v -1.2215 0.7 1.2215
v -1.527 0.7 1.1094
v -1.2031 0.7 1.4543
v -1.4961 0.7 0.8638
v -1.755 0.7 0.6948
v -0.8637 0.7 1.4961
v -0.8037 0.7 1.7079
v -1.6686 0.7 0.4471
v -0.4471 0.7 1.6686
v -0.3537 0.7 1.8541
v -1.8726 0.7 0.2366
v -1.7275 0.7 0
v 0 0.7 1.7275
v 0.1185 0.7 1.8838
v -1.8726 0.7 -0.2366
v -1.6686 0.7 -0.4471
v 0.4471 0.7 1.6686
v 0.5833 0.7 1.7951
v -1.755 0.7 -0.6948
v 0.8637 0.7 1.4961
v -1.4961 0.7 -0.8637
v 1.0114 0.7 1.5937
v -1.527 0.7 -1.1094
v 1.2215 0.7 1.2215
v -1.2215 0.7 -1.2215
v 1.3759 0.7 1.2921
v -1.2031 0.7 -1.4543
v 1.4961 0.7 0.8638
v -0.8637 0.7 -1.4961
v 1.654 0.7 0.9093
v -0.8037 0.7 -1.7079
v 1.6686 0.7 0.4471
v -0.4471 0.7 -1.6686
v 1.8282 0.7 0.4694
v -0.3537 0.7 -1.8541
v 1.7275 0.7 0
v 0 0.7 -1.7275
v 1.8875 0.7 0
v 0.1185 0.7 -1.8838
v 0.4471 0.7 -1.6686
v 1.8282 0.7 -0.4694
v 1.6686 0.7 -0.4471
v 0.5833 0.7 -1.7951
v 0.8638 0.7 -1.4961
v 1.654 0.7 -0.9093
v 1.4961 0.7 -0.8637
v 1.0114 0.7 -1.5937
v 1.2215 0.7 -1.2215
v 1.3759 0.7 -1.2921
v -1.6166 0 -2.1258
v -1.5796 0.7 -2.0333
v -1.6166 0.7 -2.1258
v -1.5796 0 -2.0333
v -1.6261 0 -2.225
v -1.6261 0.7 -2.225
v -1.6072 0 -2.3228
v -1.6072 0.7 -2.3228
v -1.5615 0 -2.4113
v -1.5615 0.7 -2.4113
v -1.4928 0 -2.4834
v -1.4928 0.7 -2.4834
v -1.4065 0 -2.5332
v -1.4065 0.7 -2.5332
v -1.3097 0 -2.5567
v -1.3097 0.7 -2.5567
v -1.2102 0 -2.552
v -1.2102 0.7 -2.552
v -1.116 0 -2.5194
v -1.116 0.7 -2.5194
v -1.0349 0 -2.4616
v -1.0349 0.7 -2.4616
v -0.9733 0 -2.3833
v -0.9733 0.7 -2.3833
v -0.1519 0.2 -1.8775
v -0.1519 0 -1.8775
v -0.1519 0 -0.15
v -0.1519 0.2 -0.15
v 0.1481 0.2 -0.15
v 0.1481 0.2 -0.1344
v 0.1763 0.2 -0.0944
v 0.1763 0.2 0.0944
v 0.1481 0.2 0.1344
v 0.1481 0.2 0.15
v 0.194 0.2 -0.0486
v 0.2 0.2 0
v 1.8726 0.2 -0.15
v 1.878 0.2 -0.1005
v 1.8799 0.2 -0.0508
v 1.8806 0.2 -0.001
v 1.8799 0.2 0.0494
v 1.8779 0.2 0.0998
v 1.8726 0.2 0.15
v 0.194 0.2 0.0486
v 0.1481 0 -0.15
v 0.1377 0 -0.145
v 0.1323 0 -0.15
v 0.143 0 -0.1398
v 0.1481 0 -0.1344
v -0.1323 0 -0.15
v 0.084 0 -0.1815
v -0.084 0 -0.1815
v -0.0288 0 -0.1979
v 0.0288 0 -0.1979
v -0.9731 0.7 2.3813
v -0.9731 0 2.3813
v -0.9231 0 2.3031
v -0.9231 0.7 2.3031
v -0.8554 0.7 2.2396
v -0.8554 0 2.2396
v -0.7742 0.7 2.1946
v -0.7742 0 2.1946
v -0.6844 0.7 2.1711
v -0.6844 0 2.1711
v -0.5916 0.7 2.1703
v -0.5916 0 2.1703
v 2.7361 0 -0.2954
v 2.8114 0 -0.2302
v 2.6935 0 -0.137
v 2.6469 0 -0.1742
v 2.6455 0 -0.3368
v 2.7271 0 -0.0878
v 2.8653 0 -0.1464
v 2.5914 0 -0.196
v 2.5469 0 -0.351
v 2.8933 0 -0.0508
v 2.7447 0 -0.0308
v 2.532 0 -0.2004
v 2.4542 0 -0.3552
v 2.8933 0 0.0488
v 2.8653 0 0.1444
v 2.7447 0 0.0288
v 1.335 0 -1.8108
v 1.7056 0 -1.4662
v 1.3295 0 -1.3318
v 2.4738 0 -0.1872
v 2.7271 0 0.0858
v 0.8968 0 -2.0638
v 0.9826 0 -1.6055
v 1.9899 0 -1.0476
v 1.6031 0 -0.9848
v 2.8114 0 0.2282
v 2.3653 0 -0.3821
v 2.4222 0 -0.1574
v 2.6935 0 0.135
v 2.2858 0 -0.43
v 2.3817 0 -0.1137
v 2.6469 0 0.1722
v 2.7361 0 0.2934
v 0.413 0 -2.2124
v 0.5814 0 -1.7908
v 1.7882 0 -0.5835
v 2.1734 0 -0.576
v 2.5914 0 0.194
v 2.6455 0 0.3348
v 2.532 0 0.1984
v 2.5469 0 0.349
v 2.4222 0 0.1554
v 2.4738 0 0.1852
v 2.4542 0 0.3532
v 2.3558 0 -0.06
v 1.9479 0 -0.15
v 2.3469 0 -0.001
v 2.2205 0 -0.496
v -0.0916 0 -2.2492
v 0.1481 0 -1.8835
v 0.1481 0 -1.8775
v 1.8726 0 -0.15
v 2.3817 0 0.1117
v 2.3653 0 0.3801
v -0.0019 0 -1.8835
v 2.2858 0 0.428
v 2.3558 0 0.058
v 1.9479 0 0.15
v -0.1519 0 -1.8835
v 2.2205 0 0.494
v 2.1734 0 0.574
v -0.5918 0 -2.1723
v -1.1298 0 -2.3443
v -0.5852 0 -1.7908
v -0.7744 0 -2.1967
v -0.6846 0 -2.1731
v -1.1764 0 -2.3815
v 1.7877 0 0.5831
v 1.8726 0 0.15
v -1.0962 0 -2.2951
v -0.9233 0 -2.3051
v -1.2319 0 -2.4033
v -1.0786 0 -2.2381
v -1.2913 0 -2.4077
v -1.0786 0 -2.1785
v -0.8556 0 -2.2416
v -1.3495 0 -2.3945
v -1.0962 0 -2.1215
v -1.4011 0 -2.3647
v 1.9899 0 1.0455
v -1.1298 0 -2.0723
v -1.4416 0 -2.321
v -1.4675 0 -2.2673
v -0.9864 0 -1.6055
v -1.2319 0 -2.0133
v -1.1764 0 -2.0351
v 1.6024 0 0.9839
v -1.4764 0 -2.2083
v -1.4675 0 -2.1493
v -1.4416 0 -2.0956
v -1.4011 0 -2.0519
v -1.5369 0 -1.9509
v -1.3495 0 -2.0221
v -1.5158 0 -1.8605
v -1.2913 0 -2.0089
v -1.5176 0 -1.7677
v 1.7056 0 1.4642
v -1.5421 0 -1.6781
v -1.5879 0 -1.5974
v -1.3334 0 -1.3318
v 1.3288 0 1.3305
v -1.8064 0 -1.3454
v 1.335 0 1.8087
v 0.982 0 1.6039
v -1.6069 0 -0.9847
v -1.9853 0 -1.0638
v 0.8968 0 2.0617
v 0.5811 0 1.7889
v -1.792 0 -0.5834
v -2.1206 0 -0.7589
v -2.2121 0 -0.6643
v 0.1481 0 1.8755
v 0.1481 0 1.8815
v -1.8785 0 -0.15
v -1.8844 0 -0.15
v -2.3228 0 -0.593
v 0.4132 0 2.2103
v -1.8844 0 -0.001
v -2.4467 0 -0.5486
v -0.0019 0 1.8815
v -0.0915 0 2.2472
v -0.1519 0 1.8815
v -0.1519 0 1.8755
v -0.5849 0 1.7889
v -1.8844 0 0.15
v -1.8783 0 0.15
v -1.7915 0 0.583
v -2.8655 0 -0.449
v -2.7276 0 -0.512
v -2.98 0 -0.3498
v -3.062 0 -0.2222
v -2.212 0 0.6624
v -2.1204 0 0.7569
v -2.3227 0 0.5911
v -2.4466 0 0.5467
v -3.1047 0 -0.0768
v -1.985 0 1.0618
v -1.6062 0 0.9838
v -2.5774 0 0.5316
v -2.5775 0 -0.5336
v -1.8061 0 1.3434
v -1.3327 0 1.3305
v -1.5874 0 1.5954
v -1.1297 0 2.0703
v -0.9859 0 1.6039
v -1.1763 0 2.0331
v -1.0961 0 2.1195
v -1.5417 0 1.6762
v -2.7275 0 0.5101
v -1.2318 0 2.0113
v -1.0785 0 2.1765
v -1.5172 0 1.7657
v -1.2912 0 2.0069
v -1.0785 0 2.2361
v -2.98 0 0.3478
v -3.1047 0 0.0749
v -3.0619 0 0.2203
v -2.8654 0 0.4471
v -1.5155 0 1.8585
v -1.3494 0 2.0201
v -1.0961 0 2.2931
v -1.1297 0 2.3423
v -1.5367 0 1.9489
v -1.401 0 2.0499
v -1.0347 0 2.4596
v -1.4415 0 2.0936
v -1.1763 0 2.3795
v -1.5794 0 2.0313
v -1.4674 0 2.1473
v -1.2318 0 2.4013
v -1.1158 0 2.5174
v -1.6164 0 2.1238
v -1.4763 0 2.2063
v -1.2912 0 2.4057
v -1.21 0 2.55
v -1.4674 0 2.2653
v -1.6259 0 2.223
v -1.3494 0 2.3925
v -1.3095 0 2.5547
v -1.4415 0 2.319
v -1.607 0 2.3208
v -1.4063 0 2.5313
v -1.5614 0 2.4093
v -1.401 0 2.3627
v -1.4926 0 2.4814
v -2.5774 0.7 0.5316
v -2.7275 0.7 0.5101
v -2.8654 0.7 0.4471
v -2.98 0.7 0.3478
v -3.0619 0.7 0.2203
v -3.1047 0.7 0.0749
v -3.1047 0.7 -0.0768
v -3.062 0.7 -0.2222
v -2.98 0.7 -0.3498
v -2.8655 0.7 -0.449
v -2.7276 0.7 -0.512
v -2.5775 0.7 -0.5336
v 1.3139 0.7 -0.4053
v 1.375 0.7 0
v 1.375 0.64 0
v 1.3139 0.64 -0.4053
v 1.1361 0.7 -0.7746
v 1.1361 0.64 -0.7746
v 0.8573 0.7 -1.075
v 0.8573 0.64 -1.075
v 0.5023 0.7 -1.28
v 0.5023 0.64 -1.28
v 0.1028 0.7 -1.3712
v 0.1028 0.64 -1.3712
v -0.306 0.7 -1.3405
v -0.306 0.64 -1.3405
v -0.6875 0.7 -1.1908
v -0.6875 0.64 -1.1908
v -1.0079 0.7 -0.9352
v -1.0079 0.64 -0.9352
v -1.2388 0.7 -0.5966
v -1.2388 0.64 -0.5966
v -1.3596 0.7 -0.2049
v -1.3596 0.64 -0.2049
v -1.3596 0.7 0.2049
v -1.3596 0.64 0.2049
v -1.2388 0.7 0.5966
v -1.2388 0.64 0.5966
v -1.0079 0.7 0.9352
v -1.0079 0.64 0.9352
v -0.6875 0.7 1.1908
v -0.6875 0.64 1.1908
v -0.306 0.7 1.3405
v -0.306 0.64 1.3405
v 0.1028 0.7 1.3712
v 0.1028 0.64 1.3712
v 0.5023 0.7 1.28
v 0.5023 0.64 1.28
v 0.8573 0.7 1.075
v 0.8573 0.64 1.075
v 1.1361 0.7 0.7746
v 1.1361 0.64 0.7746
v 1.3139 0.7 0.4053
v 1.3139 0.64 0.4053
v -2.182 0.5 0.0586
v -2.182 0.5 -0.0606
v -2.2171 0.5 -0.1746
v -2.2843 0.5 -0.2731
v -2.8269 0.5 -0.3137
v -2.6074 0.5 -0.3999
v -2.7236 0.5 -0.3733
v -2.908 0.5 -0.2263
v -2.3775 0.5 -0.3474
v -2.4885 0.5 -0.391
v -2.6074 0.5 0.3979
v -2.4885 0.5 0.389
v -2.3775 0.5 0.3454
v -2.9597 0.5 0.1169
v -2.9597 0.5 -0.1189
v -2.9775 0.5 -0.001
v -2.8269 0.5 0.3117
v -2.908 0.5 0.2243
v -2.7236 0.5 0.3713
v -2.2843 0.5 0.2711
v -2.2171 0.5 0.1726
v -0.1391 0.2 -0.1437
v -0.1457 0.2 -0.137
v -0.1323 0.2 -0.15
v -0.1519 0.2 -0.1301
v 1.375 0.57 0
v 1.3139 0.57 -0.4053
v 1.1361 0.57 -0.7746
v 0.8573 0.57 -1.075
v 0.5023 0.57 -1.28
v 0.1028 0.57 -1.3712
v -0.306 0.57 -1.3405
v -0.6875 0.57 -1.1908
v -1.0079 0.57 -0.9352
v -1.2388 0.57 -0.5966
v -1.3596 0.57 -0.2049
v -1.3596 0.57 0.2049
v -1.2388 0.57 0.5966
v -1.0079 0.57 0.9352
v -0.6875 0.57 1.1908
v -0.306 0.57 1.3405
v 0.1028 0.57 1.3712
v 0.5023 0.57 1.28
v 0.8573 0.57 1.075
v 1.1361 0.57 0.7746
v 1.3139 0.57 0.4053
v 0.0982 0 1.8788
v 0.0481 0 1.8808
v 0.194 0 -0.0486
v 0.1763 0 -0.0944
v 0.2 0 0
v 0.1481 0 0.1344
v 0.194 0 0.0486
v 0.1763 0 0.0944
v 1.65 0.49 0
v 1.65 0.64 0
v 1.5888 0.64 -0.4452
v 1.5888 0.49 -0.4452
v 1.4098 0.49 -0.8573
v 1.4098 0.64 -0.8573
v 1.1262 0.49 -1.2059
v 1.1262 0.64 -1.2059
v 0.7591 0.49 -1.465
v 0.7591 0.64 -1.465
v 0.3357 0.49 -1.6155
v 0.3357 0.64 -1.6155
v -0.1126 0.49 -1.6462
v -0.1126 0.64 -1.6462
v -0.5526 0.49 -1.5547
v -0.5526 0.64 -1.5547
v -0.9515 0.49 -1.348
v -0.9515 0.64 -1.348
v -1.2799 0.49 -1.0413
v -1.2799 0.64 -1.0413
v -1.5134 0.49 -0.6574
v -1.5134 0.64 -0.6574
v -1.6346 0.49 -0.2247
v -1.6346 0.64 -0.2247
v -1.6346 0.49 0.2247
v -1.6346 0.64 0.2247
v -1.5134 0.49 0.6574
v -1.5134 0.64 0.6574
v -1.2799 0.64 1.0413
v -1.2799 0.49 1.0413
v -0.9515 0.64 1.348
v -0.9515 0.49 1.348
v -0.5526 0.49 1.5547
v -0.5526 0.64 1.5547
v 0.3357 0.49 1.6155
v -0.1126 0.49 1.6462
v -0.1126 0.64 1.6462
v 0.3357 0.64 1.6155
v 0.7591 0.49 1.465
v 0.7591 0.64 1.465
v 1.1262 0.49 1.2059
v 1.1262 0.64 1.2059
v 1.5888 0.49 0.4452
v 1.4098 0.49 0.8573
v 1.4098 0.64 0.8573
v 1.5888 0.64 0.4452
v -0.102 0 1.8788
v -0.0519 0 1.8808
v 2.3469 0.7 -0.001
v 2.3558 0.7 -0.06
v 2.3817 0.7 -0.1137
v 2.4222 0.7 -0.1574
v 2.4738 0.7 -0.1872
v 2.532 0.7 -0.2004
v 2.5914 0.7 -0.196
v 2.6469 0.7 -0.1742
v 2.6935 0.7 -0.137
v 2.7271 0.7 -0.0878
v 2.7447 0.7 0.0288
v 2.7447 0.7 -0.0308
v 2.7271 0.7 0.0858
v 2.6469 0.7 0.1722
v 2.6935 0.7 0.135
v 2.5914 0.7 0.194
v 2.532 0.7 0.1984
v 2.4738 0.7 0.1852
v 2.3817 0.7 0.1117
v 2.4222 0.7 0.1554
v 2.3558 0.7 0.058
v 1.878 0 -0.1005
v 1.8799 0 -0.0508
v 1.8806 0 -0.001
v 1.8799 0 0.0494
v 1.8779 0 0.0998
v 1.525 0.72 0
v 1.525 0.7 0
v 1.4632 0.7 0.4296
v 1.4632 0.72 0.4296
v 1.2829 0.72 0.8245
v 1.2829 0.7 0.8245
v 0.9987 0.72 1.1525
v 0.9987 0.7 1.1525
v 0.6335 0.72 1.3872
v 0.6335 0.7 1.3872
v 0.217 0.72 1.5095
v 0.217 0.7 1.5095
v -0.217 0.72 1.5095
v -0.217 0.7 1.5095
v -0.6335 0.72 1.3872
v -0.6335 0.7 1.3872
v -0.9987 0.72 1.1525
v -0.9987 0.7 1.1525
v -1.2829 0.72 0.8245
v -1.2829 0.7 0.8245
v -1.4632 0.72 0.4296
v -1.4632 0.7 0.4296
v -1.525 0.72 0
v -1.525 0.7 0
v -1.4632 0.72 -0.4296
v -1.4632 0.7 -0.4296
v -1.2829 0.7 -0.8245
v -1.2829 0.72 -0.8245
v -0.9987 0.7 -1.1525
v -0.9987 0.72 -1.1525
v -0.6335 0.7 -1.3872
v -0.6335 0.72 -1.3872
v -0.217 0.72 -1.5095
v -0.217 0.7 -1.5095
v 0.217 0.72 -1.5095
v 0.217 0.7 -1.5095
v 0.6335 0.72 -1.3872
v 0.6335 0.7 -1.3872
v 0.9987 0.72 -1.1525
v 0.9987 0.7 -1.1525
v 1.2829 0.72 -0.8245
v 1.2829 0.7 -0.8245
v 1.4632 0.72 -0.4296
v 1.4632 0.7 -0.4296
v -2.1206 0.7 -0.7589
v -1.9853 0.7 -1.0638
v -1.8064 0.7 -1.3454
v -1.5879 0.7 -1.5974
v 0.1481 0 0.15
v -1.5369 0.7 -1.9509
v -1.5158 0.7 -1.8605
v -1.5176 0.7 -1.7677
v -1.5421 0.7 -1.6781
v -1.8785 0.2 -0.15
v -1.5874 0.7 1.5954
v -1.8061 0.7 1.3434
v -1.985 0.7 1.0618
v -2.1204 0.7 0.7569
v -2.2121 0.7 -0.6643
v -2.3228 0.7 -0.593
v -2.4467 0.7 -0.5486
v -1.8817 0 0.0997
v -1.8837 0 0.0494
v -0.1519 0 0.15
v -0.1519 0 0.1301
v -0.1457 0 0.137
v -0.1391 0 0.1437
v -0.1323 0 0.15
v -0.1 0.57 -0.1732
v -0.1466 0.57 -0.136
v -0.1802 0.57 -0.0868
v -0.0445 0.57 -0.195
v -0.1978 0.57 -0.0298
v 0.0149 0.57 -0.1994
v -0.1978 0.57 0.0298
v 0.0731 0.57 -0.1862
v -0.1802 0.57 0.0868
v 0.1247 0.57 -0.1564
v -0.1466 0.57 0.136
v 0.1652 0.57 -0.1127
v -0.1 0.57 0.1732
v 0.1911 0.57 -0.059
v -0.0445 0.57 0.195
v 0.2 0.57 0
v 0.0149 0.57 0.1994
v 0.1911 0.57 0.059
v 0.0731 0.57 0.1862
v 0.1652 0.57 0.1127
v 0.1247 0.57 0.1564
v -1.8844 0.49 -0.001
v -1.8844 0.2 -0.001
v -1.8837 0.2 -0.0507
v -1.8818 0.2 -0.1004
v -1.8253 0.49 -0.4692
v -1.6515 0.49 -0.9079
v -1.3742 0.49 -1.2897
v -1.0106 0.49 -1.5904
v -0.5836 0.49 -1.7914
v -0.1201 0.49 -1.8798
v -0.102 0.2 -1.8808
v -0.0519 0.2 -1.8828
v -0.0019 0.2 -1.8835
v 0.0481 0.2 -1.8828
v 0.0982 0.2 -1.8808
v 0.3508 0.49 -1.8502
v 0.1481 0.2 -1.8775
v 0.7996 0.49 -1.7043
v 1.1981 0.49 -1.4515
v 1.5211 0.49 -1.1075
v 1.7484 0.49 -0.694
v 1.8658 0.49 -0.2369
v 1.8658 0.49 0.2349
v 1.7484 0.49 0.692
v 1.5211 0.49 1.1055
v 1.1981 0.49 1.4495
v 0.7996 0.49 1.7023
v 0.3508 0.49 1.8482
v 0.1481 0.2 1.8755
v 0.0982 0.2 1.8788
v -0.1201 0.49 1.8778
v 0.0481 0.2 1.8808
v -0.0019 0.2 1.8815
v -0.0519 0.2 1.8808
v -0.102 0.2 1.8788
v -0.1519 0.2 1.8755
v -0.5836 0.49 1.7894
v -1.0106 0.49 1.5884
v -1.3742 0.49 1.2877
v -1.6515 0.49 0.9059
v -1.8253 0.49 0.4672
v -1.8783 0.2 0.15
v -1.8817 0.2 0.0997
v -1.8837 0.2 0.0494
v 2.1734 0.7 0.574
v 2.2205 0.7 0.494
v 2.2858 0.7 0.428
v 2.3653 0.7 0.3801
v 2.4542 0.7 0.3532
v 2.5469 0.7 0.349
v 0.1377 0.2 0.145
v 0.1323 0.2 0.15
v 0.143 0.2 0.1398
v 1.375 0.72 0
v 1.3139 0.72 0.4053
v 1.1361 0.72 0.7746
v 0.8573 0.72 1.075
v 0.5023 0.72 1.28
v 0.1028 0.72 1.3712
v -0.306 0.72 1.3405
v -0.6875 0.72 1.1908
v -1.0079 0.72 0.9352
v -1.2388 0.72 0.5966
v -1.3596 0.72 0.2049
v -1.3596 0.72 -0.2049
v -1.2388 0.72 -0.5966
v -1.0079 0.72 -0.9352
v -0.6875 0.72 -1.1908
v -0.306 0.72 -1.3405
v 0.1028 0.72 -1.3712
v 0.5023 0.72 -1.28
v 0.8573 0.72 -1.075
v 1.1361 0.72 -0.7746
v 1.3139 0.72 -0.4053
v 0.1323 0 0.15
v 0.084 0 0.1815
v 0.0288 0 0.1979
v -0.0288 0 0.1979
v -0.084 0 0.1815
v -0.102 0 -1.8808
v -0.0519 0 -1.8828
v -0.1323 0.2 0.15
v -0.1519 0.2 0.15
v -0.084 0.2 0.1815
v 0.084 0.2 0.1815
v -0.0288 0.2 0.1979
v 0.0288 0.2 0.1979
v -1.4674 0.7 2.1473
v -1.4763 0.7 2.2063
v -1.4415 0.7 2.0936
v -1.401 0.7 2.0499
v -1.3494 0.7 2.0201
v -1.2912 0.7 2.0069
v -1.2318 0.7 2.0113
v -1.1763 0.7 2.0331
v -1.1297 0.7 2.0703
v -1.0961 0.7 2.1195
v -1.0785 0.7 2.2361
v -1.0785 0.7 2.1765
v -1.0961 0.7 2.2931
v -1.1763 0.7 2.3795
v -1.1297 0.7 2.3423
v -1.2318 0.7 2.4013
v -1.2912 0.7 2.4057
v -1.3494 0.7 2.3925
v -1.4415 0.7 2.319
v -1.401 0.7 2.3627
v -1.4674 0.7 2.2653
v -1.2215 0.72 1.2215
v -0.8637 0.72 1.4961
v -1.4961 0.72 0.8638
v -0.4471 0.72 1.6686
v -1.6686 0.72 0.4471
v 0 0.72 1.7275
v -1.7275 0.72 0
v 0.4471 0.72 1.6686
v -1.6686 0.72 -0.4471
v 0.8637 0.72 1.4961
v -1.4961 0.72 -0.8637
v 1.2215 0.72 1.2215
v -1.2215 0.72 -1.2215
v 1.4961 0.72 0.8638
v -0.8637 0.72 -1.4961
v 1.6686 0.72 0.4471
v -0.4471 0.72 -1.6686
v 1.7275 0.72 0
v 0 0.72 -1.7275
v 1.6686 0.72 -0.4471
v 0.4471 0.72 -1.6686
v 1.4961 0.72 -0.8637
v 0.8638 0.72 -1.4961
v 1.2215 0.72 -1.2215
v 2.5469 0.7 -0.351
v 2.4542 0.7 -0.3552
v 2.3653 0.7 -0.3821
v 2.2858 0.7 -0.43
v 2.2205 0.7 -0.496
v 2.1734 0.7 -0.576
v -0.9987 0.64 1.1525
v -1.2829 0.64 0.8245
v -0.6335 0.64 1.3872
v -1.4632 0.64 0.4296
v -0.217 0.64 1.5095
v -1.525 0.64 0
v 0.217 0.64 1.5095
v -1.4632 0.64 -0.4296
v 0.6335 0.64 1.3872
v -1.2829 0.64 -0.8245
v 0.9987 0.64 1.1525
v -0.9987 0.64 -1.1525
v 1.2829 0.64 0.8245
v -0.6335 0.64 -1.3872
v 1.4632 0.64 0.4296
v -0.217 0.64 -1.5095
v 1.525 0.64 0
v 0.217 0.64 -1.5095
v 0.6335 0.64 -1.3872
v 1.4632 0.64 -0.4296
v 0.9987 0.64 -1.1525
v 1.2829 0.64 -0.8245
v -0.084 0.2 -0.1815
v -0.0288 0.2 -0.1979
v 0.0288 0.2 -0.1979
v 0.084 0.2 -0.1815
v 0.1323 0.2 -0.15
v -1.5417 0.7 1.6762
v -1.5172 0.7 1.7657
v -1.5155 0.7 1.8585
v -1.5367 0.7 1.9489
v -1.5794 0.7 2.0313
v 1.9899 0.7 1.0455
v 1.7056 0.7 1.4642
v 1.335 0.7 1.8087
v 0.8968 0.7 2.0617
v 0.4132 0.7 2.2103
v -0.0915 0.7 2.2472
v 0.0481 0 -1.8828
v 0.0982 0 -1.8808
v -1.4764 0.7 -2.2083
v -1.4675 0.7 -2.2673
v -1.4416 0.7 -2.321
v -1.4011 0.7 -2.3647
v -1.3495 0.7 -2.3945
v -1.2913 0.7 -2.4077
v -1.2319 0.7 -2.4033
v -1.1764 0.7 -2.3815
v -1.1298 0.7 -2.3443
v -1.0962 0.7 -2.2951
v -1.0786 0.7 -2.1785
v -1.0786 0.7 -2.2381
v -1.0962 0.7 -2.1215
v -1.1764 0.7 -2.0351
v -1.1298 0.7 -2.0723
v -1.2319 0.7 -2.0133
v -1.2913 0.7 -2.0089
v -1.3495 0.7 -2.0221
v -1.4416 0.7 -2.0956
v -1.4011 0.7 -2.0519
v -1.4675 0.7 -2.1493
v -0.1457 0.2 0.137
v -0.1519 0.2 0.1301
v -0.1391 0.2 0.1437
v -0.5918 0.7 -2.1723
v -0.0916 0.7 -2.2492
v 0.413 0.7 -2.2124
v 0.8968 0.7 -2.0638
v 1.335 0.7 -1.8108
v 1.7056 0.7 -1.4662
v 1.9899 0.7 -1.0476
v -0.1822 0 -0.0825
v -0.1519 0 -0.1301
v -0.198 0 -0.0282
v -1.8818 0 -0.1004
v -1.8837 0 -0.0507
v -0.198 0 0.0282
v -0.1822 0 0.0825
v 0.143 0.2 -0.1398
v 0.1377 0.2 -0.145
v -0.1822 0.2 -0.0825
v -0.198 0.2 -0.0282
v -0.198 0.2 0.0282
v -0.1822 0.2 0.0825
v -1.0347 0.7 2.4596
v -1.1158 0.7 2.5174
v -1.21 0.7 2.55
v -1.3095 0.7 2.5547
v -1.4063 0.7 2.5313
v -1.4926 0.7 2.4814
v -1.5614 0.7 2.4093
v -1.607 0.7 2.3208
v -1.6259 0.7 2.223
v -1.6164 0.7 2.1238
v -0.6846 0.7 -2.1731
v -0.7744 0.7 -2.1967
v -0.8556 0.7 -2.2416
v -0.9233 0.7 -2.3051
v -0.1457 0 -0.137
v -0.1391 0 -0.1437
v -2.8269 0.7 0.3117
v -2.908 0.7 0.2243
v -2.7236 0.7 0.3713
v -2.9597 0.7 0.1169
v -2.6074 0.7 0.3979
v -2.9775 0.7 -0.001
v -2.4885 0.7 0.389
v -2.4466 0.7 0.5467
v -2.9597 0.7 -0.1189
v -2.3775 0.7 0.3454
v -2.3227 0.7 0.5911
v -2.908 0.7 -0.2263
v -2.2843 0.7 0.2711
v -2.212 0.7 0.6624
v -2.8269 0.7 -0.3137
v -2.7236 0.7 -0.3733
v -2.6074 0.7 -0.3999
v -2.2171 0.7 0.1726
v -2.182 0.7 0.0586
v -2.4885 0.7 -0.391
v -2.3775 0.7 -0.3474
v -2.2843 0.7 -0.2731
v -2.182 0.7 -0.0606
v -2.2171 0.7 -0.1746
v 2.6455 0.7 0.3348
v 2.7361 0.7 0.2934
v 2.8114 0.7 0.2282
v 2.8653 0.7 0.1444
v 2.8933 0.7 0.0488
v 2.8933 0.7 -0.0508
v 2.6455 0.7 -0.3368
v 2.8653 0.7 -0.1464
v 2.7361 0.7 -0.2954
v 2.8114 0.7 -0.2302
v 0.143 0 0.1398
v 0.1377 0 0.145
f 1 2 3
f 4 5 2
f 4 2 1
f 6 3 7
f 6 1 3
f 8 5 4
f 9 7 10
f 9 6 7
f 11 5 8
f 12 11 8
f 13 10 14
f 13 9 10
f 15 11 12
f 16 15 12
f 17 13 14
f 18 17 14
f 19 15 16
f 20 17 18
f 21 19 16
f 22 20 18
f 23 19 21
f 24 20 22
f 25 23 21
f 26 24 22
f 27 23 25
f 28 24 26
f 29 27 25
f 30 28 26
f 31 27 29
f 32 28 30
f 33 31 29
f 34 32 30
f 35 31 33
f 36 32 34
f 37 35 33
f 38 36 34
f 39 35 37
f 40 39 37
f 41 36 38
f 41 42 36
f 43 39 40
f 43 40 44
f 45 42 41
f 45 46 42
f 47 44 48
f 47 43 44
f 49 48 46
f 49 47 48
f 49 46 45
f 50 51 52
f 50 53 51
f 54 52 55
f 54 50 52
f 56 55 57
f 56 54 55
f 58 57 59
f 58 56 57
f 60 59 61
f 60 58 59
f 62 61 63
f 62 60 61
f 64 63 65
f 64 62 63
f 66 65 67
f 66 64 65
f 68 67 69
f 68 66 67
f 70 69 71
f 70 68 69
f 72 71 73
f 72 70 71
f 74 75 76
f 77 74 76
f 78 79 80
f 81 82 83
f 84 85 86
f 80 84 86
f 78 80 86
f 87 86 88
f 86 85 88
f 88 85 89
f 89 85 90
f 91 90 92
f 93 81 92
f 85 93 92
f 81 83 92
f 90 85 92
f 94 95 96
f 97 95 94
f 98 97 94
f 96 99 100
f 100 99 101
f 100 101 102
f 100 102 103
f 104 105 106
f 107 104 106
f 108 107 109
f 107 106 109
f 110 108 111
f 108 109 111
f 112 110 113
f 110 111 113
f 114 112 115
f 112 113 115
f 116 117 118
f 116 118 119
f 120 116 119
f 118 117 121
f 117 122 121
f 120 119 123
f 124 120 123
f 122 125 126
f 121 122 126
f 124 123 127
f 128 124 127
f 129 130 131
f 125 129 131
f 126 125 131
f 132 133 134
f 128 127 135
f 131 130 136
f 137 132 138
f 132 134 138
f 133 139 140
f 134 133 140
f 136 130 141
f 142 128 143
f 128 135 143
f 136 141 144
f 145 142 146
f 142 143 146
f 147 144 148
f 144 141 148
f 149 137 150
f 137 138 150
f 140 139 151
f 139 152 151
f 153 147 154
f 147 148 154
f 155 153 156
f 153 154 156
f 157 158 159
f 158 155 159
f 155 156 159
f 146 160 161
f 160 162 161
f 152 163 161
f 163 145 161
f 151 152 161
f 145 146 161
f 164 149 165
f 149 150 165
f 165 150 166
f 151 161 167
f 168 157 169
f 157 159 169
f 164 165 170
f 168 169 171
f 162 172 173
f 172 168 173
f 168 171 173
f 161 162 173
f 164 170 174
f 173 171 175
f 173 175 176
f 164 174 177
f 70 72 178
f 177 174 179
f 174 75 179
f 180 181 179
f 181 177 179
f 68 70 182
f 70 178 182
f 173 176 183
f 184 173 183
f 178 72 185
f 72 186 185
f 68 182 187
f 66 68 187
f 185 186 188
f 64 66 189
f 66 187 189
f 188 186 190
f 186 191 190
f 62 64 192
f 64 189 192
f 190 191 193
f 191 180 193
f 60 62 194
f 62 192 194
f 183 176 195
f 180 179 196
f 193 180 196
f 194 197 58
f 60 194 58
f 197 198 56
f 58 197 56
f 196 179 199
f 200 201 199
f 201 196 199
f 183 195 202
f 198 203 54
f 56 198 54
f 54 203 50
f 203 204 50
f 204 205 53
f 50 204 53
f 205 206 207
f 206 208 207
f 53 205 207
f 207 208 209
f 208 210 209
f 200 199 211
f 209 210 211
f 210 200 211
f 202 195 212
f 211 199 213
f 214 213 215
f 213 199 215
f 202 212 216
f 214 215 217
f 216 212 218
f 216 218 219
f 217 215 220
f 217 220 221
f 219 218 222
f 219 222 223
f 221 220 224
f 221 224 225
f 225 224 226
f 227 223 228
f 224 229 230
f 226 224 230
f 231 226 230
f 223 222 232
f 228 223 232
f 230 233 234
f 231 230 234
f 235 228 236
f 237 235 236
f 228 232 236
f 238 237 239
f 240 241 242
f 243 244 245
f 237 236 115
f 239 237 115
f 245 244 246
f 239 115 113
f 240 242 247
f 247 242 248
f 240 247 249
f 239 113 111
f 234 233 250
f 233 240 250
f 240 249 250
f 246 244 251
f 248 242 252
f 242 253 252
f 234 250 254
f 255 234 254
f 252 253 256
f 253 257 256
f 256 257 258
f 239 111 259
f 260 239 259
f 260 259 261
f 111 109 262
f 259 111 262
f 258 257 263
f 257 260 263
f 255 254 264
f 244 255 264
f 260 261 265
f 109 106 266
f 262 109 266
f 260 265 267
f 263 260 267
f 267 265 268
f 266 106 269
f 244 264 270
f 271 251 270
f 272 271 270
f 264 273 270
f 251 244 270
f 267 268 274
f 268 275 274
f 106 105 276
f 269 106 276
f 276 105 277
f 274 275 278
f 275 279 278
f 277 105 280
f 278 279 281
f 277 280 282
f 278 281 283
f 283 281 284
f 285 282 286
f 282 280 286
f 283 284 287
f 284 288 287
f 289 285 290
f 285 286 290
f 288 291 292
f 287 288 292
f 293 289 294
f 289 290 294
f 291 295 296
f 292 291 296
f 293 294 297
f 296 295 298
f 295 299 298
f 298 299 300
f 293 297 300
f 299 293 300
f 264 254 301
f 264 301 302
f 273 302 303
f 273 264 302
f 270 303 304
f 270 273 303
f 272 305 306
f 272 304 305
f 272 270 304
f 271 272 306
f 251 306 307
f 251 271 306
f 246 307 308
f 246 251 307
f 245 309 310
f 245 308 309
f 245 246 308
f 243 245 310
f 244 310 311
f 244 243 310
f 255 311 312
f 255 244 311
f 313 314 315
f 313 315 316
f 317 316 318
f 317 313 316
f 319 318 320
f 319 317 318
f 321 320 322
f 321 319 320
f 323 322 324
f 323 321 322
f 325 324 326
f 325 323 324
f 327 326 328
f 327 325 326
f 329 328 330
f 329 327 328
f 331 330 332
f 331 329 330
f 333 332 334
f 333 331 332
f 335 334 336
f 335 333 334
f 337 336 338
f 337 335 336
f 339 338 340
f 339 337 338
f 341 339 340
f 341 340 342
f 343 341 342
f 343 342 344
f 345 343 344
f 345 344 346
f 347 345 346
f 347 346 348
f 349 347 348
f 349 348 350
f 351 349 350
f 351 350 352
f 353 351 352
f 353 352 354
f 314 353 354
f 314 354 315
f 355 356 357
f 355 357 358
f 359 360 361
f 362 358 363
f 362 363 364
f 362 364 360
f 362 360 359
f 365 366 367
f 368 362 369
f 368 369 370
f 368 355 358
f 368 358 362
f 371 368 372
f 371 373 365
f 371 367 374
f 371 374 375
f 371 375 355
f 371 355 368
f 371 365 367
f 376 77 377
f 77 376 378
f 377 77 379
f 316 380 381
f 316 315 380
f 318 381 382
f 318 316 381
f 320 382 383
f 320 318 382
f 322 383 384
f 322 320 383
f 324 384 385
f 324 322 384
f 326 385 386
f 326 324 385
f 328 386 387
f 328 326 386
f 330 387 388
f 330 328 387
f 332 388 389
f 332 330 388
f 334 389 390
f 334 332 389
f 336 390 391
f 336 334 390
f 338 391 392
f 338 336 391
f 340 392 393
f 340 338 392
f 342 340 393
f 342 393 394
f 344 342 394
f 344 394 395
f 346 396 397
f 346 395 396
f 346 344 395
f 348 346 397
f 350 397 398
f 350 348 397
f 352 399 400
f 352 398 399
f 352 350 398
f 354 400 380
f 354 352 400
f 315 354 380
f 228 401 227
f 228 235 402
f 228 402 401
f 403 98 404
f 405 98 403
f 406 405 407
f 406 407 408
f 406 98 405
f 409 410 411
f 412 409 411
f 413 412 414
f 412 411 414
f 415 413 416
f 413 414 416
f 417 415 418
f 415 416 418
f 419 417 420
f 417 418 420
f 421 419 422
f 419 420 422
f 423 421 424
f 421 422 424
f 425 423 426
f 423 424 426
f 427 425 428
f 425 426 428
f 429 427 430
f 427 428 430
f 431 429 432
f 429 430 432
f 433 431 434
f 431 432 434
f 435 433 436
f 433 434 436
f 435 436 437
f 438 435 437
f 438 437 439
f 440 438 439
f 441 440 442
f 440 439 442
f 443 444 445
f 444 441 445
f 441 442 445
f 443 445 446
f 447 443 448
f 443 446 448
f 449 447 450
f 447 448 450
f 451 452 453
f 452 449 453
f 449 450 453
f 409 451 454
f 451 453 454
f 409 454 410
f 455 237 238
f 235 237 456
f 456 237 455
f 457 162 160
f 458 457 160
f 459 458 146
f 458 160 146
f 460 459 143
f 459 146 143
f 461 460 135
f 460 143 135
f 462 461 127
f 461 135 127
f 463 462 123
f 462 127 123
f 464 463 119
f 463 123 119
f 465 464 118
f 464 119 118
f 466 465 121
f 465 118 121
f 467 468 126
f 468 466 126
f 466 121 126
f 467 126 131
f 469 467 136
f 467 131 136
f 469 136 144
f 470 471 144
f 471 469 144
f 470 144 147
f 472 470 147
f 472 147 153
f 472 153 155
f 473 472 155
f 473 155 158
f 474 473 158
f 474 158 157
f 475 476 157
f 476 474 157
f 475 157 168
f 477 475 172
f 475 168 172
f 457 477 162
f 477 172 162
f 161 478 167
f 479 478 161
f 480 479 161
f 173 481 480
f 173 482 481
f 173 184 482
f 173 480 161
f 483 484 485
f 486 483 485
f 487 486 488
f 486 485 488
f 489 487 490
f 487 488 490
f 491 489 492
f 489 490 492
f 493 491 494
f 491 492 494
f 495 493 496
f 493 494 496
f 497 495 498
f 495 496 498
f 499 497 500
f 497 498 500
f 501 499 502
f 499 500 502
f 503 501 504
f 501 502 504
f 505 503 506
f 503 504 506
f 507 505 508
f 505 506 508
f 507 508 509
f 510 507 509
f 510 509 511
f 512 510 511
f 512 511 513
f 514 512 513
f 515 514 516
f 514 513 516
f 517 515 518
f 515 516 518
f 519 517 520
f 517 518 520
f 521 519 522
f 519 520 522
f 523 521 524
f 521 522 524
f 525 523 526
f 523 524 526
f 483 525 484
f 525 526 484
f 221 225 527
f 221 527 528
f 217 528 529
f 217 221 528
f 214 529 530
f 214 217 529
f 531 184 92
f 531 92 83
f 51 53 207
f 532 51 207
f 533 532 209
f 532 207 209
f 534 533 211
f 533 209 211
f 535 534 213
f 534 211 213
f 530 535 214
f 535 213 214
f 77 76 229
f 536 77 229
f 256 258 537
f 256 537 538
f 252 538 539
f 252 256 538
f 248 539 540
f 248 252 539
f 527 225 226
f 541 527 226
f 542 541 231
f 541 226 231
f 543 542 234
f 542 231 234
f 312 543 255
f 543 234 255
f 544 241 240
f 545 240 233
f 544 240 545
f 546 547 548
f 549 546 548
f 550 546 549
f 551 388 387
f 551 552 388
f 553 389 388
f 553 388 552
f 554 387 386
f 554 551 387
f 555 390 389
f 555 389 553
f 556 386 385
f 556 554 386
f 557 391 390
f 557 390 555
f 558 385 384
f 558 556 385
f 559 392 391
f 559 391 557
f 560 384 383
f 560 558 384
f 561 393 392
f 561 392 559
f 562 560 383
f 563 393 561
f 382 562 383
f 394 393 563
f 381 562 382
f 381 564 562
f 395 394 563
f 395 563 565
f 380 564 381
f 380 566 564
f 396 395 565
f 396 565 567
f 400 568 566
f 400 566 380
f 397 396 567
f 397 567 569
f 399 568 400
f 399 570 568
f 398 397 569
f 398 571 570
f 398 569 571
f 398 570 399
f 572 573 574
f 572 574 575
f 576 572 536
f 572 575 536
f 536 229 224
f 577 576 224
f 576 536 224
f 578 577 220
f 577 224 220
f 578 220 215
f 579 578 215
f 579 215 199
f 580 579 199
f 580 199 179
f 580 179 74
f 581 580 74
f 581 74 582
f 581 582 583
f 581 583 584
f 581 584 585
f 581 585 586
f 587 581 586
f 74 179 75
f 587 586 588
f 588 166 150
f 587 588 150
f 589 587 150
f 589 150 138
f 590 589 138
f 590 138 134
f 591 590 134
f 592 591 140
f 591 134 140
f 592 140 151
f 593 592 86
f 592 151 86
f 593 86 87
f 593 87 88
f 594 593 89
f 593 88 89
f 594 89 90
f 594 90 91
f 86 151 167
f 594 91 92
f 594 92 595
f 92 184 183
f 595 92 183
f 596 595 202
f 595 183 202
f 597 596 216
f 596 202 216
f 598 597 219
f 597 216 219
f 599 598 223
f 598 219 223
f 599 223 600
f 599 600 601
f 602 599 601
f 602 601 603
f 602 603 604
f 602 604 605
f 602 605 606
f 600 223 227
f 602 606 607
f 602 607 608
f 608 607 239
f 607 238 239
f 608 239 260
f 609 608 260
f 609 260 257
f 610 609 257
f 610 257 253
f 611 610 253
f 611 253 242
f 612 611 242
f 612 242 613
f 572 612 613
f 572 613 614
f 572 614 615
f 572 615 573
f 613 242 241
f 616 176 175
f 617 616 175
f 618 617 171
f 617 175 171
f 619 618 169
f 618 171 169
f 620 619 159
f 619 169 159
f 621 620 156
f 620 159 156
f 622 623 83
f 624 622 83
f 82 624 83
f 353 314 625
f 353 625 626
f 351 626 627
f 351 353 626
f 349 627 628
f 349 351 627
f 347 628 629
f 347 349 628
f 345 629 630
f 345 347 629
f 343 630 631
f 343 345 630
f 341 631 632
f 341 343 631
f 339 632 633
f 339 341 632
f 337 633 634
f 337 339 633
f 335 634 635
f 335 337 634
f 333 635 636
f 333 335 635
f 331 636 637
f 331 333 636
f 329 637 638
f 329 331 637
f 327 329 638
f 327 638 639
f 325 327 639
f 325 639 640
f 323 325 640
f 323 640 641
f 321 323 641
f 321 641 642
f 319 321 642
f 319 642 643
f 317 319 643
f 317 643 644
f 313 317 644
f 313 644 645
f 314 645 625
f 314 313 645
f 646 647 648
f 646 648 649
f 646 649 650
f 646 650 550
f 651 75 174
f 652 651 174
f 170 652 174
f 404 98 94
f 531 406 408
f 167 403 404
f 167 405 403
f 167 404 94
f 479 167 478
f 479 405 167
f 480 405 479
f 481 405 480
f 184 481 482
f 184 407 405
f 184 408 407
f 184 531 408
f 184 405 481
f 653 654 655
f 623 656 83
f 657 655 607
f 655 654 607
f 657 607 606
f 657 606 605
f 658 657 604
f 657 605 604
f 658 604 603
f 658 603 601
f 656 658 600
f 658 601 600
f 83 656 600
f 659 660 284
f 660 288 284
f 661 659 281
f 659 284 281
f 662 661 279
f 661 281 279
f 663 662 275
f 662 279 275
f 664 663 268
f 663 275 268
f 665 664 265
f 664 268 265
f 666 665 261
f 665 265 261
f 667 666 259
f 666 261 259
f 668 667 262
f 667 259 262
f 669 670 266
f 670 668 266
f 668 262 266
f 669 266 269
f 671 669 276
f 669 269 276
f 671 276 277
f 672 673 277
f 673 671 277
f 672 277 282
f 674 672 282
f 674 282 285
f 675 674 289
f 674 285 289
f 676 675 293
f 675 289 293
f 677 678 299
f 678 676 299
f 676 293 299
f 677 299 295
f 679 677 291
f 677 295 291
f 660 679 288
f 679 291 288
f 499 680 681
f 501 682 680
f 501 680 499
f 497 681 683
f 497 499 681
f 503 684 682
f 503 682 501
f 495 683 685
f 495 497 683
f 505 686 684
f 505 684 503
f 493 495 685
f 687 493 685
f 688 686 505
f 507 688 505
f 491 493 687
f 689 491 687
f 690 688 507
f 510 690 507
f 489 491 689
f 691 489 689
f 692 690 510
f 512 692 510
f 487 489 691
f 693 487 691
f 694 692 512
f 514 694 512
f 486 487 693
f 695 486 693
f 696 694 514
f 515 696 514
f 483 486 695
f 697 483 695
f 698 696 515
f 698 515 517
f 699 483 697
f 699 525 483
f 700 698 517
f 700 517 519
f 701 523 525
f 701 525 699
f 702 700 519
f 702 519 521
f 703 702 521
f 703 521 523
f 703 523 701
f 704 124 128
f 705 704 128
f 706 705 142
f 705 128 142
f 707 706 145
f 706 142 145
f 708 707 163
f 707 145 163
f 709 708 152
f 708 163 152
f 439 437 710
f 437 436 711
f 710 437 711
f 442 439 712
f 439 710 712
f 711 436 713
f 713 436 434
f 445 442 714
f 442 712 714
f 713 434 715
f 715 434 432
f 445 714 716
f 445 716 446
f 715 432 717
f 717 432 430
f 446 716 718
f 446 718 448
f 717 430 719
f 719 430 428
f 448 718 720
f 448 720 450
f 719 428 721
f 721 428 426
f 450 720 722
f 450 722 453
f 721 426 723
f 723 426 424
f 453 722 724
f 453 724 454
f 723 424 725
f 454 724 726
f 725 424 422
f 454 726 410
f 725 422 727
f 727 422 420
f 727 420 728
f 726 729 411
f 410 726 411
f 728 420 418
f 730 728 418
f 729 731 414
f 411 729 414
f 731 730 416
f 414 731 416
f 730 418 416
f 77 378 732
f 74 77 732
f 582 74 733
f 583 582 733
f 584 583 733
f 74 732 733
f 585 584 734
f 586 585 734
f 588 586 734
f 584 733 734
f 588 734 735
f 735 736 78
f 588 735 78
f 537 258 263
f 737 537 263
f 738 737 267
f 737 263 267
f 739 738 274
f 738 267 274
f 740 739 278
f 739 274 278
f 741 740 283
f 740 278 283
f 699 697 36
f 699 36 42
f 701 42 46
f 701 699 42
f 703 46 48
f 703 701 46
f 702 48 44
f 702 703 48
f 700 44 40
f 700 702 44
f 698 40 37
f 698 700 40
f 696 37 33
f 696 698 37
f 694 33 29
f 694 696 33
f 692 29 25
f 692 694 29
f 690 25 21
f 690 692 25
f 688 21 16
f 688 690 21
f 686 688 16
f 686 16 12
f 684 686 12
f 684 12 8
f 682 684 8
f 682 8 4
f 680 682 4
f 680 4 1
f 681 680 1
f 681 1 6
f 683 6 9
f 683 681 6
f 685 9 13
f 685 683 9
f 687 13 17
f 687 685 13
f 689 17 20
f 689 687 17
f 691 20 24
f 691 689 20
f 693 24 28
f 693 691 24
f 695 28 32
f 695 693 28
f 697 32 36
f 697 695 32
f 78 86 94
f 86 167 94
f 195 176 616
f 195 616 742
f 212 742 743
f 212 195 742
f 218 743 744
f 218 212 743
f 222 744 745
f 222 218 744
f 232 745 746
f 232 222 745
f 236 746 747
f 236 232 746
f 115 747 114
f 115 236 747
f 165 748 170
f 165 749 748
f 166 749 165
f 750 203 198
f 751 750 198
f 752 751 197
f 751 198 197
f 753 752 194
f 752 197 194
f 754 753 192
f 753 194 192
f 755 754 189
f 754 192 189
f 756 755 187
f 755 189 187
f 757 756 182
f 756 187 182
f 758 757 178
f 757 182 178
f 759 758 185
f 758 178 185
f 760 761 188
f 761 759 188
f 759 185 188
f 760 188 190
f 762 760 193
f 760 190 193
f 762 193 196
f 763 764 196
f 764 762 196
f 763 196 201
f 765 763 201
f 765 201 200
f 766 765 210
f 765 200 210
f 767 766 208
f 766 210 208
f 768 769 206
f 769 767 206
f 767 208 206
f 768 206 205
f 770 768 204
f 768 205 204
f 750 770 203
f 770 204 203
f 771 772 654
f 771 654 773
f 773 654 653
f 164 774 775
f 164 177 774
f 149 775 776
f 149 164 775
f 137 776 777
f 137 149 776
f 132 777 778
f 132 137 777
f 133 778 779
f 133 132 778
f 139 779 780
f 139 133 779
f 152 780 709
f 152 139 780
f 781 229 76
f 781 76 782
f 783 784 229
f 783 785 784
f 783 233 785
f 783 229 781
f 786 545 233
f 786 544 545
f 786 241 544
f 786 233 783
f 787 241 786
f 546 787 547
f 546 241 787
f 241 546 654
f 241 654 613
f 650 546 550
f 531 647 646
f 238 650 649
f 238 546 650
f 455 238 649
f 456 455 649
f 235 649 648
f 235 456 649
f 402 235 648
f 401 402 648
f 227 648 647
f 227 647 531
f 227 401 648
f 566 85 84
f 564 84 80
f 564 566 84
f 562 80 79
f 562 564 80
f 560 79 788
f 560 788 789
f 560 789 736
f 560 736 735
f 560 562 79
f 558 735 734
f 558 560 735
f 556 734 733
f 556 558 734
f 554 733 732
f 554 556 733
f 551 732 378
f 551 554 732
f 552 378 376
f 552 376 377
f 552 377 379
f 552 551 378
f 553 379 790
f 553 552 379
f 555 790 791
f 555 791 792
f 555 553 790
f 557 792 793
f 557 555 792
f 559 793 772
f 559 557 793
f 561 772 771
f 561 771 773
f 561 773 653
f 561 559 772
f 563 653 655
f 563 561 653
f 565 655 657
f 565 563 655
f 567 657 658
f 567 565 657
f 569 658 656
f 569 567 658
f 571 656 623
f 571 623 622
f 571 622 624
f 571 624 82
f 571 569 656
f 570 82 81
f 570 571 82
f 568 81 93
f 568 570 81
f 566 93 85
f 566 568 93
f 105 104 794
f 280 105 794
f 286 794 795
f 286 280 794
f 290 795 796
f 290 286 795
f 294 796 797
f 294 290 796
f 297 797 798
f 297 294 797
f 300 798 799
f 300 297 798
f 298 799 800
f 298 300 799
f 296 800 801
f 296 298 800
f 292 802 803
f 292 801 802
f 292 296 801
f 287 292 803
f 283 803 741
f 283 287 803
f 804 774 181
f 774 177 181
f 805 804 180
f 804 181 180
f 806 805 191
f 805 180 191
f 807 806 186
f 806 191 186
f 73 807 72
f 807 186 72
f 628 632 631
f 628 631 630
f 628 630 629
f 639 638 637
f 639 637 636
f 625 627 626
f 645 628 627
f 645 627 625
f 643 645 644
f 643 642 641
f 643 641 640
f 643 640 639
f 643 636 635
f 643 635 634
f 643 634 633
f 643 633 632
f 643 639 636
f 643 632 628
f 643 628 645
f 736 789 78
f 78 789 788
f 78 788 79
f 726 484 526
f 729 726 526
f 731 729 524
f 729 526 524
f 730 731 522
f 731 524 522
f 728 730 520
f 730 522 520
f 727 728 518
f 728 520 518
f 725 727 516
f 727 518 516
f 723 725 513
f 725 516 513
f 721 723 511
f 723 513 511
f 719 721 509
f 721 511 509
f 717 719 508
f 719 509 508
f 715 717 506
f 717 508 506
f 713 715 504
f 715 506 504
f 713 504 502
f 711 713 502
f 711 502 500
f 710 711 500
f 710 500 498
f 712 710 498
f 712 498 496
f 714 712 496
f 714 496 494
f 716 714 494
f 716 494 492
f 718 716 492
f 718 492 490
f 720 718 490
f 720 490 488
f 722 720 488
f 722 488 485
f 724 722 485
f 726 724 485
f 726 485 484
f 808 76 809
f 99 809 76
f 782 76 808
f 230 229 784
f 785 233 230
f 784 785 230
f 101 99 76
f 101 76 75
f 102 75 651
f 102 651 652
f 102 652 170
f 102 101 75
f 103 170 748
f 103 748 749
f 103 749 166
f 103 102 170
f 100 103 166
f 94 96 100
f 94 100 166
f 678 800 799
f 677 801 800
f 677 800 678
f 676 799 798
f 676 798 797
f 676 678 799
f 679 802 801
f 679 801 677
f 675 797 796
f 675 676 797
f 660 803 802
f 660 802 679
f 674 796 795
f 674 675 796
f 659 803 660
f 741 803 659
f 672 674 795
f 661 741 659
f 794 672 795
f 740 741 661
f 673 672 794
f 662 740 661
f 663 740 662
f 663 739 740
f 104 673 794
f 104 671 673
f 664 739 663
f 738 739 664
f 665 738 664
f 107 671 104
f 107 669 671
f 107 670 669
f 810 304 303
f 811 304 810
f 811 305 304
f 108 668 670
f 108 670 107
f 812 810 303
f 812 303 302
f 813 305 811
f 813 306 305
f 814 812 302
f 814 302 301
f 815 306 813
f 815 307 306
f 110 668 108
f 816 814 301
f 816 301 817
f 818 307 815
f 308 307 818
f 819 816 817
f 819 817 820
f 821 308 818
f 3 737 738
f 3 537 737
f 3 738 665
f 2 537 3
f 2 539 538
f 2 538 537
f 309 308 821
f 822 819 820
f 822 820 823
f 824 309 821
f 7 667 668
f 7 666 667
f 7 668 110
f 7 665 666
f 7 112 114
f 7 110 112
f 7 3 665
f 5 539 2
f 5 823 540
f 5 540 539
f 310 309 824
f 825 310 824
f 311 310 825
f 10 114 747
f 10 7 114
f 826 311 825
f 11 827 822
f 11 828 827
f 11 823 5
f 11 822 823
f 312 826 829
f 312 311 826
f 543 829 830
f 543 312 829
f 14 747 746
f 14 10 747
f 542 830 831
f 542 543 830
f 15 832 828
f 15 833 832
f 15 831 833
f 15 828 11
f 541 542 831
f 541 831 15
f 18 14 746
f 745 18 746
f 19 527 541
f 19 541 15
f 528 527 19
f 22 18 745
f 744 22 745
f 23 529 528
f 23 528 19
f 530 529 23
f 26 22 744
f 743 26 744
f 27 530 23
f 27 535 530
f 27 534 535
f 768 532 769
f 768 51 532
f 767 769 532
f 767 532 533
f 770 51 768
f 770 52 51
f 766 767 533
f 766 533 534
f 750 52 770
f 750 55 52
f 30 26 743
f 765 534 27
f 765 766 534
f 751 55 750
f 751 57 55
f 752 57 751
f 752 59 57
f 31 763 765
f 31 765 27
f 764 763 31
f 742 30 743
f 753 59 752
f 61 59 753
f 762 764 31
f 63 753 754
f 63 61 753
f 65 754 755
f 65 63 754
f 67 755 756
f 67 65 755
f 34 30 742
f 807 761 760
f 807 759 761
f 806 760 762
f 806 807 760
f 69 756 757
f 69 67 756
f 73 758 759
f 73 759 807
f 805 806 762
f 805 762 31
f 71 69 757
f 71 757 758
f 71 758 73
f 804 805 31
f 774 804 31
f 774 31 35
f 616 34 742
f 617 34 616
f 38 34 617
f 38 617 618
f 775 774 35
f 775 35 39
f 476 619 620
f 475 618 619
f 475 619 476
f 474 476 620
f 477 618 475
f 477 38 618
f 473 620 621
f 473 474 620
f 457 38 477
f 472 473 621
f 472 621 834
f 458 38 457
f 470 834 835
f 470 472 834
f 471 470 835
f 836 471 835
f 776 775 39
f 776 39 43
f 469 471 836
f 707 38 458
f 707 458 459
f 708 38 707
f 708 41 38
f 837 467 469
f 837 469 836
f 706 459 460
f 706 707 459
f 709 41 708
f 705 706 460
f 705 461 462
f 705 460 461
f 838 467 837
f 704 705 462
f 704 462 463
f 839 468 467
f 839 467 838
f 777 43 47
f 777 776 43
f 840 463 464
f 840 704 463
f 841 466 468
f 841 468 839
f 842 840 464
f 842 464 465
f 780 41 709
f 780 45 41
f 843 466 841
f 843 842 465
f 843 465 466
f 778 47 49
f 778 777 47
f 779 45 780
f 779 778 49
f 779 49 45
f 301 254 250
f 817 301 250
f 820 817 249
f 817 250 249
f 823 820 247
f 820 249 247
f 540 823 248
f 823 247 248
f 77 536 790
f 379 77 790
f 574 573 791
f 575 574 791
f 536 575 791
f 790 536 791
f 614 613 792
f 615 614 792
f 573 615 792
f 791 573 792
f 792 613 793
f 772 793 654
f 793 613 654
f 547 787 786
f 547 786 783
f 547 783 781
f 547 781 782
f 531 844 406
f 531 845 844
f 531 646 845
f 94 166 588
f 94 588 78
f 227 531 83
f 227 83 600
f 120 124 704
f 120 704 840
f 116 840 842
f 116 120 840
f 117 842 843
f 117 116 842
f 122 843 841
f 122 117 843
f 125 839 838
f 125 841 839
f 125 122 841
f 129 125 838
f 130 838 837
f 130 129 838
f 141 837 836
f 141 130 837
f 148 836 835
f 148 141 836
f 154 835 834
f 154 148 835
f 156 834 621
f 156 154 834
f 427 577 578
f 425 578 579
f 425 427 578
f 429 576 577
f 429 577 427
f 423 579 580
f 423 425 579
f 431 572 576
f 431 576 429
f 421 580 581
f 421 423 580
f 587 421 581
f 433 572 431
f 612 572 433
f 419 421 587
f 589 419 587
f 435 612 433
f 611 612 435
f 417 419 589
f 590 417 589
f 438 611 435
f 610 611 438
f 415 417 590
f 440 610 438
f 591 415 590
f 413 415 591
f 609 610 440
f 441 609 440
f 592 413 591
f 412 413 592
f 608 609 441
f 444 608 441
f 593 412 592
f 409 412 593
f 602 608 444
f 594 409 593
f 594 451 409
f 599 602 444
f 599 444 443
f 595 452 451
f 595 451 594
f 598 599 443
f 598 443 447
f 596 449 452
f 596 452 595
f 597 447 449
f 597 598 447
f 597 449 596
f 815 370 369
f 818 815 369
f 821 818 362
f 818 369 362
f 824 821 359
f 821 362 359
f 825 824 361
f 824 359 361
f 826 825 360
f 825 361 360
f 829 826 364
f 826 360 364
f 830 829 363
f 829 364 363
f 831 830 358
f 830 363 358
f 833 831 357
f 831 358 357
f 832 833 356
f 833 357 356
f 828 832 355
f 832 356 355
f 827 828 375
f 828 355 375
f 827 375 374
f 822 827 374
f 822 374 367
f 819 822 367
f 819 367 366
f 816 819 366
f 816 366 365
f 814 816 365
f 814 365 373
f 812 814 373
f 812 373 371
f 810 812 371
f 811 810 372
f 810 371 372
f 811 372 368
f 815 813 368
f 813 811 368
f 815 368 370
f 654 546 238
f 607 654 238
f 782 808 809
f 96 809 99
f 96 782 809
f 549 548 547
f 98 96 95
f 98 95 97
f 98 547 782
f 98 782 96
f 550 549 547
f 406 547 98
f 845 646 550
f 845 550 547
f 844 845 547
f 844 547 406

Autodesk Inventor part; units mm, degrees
ref_plane "YZ Plane" through (0, 0, 0) normal (1, 0, 0) x (0, 1, 0)
ref_plane "XZ Plane" through (0, 0, 0) normal (0, 1, 0) x (-1, 0, 0)
ref_plane "XY Plane" through (0, 0, 0) normal (0, 0, 1) x (1, 0, 0)
sketch "Boceto1" plane through (0, 0, 0) normal (0, 1, 0) x (-1, 0, 0)
  circle A0 centre (-2.5469, -0.001) radius 0.2
  arc A1 (2.5775, -0.5336) -> (2.5774, 0.5316) centre (2.5775, -0.001) ccw
  circle A2 centre (2.5775, -0.001) radius 0.4
  arc A3 (2.5775, -0.5336) -> (2.1206, -0.7589) centre (2.5776, -1.11) ccw
  arc A4 (2.1204, 0.7569) -> (2.5774, 0.5316) centre (2.5774, 1.108) ccw
  arc A5 (-2.5469, 0.349) -> (-2.1734, 0.574) centre (-2.5174, 0.7225) ccw
  arc A6 (-2.1734, -0.576) -> (-2.5469, -0.351) centre (-2.5174, -0.7245) ccw
  arc A7 (-2.5469, 0.349) -> (-2.5469, -0.351) centre (-2.5469, -0.001) ccw
  circle A8 centre (1.2763, 2.2063) radius 0.2
  arc A9 (1.5794, 2.0313) -> (1.5874, 1.5954) centre (1.888, 1.819) ccw
  arc A10 (0.5916, 2.1703) -> (0.9731, 2.3813) centre (0.6349, 2.5425) ccw
  arc A11 (1.5794, 2.0313) -> (0.9731, 2.3813) centre (1.2763, 2.2063) ccw
  circle A12 centre (1.2764, -2.2083) radius 0.2
  arc A13 (0.9733, -2.3833) -> (0.5918, -2.1723) centre (0.6351, -2.5444) ccw
  arc A14 (1.5879, -1.5974) -> (1.5796, -2.0333) centre (1.8883, -1.8211) ccw
  arc A15 (0.9733, -2.3833) -> (1.5796, -2.0333) centre (1.2764, -2.2083) ccw
  circle A16 centre (0.0019, -0.001) radius 1.8825
  arc A17 (-2.1734, -0.576) -> (0.5918, -2.1723) centre (0.0019, -0.001) ccw
  arc A18 (0.5916, 2.1703) -> (-2.1734, 0.574) centre (0.0019, -0.001) ccw
  arc A19 (2.1204, 0.7569) -> (1.5874, 1.5954) centre (0.0019, -0.001) ccw
  arc A20 (1.5879, -1.5974) -> (2.1206, -0.7589) centre (0, 0) ccw
extrude "Extrusión1" add sketch "Boceto1" along normal blind 0.7
sketch "Boceto2" plane through (0, 0, 0) normal (0, 1, 0) x (-1, 0, 0)
  circle A0 centre (-2.5469, -0.001) radius 0.2
  arc A1 (2.5775, -0.5336) -> (2.5774, 0.5316) centre (2.5775, -0.001) ccw
  circle A2 centre (2.5775, -0.001) radius 0.4
  arc A3 (2.5775, -0.5336) -> (2.1206, -0.7589) centre (2.5776, -1.11) ccw
  arc A4 (2.1204, 0.7569) -> (2.5774, 0.5316) centre (2.5774, 1.108) ccw
  arc A5 (-2.5469, 0.349) -> (-2.1734, 0.574) centre (-2.5174, 0.7225) ccw
  arc A6 (-2.1734, -0.576) -> (-2.5469, -0.351) centre (-2.5174, -0.7245) ccw
  arc A7 (-2.5469, 0.349) -> (-2.5469, -0.351) centre (-2.5469, -0.001) ccw
  circle A8 centre (1.2763, 2.2063) radius 0.2
  arc A9 (1.5794, 2.0313) -> (1.5874, 1.5954) centre (1.888, 1.819) ccw
  arc A10 (0.5916, 2.1703) -> (0.9731, 2.3813) centre (0.6349, 2.5425) ccw
  arc A11 (1.5794, 2.0313) -> (0.9731, 2.3813) centre (1.2763, 2.2063) ccw
  circle A12 centre (1.2764, -2.2083) radius 0.2
  arc A13 (0.9733, -2.3833) -> (0.5918, -2.1723) centre (0.6351, -2.5444) ccw
  arc A14 (1.5879, -1.5974) -> (1.5796, -2.0333) centre (1.8883, -1.8211) ccw
  arc A15 (0.9733, -2.3833) -> (1.5796, -2.0333) centre (1.2764, -2.2083) ccw
  circle A16 centre (0.0019, -0.001) radius 1.8825
  arc A17 (-2.1734, -0.576) -> (0.5918, -2.1723) centre (0.0019, -0.001) ccw
  arc A18 (0.5916, 2.1703) -> (-2.1734, 0.574) centre (0.0019, -0.001) ccw
  arc A19 (2.1204, 0.7569) -> (1.5874, 1.5954) centre (0.0019, -0.001) ccw
  arc A20 (1.5879, -1.5974) -> (2.1206, -0.7589) centre (0, 0) ccw
  point P0 (0, 0)
extrude "Extrusión2" add sketch "Boceto2" along normal blind 0.5 contours A2
sketch "Boceto3" plane through (0, 0.7, 0) normal (0, 1, 0) x (1, 0, 0)
  circle A0 centre (-0.0019, 0.001) radius 1.8825 projected
  point P0 (0, 0)
extrude "Extrusión3" add sketch "Boceto3" against normal blind 0.06
sketch "Boceto4" plane through (-0.0019, 0.64, -0.001) normal (0, -1, 0) x (1, 0, 0)
  circle A0 centre (0.0019, 0.001) radius 1.65
  circle A1 centre (0, 0) radius 1.8825 projected
  dimension "d6" = 3.3
extrude "Extrusión4" add sketch "Boceto4" along normal blind 0.15
sketch "Boceto5" plane through (0, 0.7, 0) normal (0, 1, 0) x (1, 0, 0)
  circle A0 centre (0, 0) radius 1.525
  circle A1 centre (0, 0) radius 1.375
  dimension "d9" = 3.05
  dimension "d11" = 2.75
extrude "Extrusión5" cut sketch "Boceto5" against normal blind 0.1
sketch "Boceto6" plane through (0, 0.64, 0) normal (0, -1, 0) x (1, 0, 0)
  circle A0 centre (0, 0) radius 0.2
  dimension "d14" = 0.4
extrude "Extrusión6" add sketch "Boceto6" along normal blind 0.64
sketch "Boceto7" plane through (0, 0, 0) normal (0, -1, 0) x (1, 0, 0)
  circle A0 centre (-0.0019, -0.001) radius 1.8825 projected
  line L0 (-0.1519, -1.8835) -> (-0.1519, 1.8815)
  line L1 (1.8726, 0.15) -> (-1.8844, 0.15)
  line L2 (1.8726, -0.15) -> (-1.8844, -0.15)
  line L3 (0.1481, -1.8835) -> (0.1481, 1.8815)
  line L4 (1.8726, -0.15) -> (1.9479, -0.15)
  line L5 (1.9479, -0.15) -> (1.9479, 0.15)
  line L6 (1.9479, 0.15) -> (1.8726, 0.15)
  line L7 (-0.1519, -1.8835) -> (0.1481, -1.8835)
  line L8 (-1.8844, -0.15) -> (-1.8844, 0.15)
  line L9 (0.1481, 1.8815) -> (-0.1519, 1.8815)
  point P0 (0, 0)
extrude "Extrusión7" add sketch "Boceto7" against normal blind 0.2 contours A0 L2 L3 L1 | A0 L6 L5 L4 | L3 L1 L0 A0 | A0 L9 L3 | L3 L2 L0 L1 | L3 L7 A0 | A0 L0 L2 L3 | A0 L0 L9 | L0 L2 A0 L1 | L7 L0 A0 | A0 L8 L1 | L2 L8 A0
sketch "Boceto8" plane through (0, 0.7, 0) normal (0, 1, 0) x (1, 0, 0)
  circle A0 centre (0, 0) radius 1.8875
  circle A1 centre (0, 0) radius 1.525 projected
  circle A2 centre (0, 0) radius 1.375 projected
  dimension "d23" = 3.775
extrude "Extrusión8" add sketch "Boceto8" along normal blind 0.02
sketch "Boceto9" plane through (0, 0.64, 0) normal (0, -1, 0) x (1, 0, 0)
  circle A0 centre (0, 0) radius 0.2 projected
  circle A1 centre (0, 0) radius 1.375 projected
extrude "Extrusión9" add sketch "Boceto9" along normal blind 0.07
sketch "Boceto10" plane through (0, 0.72, 0) normal (0, 1, 0) x (1, 0, 0)
  circle A0 centre (0, 0) radius 1.8875 projected
  circle A1 centre (0, 0) radius 1.7275
  point P0 (0, 0)
  dimension "d28" = 0.16
extrude "Extrusión10" cut sketch "Boceto10" against normal blind 0.02
properties part number "ET3"
